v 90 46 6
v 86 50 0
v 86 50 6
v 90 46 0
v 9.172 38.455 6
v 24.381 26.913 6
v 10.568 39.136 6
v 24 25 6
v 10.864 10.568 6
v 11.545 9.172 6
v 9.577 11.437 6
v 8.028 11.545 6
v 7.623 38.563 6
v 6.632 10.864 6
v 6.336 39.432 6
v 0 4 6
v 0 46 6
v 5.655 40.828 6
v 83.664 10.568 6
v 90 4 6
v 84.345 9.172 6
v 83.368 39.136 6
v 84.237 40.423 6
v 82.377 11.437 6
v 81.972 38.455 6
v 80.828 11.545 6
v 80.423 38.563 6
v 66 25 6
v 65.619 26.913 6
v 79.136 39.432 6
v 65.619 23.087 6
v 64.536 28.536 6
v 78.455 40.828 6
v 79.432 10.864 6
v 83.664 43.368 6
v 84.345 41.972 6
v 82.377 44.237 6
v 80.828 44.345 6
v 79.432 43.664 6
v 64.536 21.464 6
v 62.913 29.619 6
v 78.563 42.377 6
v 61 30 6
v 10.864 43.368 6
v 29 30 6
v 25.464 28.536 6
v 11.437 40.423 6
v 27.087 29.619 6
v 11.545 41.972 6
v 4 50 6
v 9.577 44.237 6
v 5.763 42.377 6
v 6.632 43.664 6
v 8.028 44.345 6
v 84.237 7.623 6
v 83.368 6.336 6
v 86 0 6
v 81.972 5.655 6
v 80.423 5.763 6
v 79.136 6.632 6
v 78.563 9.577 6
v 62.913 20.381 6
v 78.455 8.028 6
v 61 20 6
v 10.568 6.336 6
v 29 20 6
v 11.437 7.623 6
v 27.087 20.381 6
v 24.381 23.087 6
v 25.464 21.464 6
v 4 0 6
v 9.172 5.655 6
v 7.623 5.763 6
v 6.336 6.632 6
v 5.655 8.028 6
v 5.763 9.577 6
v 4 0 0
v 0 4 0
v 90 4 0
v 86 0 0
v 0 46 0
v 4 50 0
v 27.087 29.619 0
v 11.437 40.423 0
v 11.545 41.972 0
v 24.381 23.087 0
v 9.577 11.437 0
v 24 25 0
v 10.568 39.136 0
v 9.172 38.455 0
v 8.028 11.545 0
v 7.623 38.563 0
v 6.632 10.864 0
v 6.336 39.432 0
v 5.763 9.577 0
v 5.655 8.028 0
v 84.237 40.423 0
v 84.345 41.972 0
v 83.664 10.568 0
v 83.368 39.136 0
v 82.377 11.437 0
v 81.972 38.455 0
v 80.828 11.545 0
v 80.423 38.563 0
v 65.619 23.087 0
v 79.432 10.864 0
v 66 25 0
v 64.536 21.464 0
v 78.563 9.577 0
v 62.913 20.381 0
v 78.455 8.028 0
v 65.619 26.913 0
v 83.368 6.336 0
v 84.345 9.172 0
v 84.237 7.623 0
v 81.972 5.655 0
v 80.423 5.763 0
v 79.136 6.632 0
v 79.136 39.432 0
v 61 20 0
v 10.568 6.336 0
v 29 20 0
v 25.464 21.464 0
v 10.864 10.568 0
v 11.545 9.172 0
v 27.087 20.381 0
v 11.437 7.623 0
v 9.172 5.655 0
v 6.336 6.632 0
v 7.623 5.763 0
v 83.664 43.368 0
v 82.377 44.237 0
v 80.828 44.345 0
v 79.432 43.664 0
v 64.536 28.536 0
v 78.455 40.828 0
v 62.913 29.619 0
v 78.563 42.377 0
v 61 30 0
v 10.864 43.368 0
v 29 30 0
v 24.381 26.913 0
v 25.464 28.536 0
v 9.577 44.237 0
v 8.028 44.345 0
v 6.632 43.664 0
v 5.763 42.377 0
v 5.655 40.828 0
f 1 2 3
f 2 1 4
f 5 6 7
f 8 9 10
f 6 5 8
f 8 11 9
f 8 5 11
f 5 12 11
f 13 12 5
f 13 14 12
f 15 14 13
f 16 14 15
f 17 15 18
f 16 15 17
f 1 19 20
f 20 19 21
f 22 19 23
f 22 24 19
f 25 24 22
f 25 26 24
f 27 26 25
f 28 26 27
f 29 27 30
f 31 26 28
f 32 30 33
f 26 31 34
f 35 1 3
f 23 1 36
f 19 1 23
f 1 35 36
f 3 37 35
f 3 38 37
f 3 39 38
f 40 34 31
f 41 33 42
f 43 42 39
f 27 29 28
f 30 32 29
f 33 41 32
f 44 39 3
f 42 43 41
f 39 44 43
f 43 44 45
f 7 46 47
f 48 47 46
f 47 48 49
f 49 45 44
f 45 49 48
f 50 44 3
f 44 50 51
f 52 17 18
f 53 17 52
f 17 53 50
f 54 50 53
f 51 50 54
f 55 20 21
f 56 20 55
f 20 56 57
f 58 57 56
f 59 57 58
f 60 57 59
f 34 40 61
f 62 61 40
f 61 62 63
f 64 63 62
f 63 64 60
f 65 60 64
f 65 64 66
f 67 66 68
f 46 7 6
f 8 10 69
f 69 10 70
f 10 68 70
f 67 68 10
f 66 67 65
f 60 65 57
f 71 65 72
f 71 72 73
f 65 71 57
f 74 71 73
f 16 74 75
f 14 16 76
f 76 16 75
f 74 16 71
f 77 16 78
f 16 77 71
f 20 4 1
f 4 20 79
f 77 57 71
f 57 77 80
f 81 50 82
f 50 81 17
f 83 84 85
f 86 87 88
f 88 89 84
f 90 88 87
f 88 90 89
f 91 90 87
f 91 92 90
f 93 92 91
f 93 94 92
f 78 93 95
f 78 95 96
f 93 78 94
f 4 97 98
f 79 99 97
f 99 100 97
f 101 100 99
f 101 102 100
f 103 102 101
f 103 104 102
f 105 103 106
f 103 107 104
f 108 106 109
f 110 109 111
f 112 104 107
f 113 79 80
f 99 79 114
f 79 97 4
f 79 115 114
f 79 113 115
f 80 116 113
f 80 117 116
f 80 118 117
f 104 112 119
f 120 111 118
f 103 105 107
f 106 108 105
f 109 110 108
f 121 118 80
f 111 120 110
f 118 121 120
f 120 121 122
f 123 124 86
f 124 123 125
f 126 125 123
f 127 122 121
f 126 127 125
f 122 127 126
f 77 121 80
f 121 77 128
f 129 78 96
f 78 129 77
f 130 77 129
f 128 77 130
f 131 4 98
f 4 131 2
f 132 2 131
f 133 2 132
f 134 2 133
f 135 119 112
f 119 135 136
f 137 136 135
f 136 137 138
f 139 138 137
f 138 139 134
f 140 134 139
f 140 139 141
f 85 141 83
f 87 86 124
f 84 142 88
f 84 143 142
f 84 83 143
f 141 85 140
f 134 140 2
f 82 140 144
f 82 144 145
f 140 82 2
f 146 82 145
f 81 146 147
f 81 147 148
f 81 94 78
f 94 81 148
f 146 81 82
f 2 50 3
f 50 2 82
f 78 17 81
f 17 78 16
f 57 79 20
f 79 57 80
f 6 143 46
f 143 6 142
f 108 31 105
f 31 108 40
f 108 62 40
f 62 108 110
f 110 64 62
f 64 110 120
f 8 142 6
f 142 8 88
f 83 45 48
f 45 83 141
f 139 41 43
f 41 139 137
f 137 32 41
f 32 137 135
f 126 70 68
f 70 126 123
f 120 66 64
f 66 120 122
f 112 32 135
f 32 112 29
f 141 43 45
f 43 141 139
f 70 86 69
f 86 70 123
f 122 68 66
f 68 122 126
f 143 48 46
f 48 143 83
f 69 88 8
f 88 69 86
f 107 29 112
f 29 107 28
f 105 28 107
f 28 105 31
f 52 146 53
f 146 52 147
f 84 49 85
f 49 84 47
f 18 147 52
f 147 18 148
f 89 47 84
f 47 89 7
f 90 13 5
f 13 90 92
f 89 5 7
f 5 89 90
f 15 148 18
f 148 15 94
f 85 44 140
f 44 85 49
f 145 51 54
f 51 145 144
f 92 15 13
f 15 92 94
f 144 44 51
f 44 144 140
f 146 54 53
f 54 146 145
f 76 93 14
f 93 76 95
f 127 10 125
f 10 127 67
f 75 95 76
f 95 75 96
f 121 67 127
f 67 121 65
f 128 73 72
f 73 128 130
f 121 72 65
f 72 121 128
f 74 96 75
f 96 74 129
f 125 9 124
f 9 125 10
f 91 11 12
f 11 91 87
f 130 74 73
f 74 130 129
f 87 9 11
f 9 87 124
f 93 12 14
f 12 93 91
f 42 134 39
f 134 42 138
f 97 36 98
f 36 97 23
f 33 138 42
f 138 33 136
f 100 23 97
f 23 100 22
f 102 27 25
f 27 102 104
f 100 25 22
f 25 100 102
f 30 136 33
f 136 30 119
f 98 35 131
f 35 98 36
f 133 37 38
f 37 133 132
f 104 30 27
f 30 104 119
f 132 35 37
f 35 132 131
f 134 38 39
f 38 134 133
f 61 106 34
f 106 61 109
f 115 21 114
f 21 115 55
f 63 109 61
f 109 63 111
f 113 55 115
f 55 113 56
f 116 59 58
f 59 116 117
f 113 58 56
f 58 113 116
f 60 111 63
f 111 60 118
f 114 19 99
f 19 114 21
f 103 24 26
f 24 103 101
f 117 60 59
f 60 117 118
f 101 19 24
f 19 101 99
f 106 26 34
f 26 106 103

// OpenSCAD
$fn = 32;

// ----------------------------------------------------------------------
// Bracket plate: slot plate 90 x 50
// ----------------------------------------------------------------------

// --- parameters (mm) ---
hole_r = 3;               // bolt hole radius
plate_t = 6;              // plate thickness, Z (extrusion height)
plate_l = 90;             // plate length
plate_w = 50;             // plate width
slot_l = 32;              // slot straight length
slot_r = 5;               // slot end radius

slot_len = slot_l + 2 * slot_r;
slot_w = 2 * slot_r;
hole_d2 = 2 * hole_r;

profile = [[4, 0], [86, 0], [90, 4], [90, 46], [86, 50], [4, 50], [0, 46], [0, 4]];  // primary outline, 8 points, counter clockwise
void_1 = [[61, 20], [62.913, 20.381], [64.536, 21.464], [65.619, 23.087], [66, 25], [65.619, 26.913], [64.536, 28.536], [62.913, 29.619], [61, 30], [29, 30], [27.087, 29.619], [25.464, 28.536], [24.381, 26.913], [24, 25], [24.381, 23.087], [25.464, 21.464], [27.087, 20.381], [29, 20]];  // grip slot, 18 points
void_2 = [[11.545, 41.972], [10.864, 43.368], [9.577, 44.237], [8.028, 44.345], [6.632, 43.664], [5.763, 42.377], [5.655, 40.828], [6.336, 39.432], [7.623, 38.563], [9.172, 38.455], [10.568, 39.136], [11.437, 40.423]];  // corner hole, 12 points
void_3 = [[11.545, 9.172], [10.864, 10.568], [9.577, 11.437], [8.028, 11.545], [6.632, 10.864], [5.763, 9.577], [5.655, 8.028], [6.336, 6.632], [7.623, 5.763], [9.172, 5.655], [10.568, 6.336], [11.437, 7.623]];  // corner hole, 12 points
void_4 = [[84.345, 41.972], [83.664, 43.368], [82.377, 44.237], [80.828, 44.345], [79.432, 43.664], [78.563, 42.377], [78.455, 40.828], [79.136, 39.432], [80.423, 38.563], [81.972, 38.455], [83.368, 39.136], [84.237, 40.423]];  // corner hole, 12 points
void_5 = [[84.345, 9.172], [83.664, 10.568], [82.377, 11.437], [80.828, 11.545], [79.432, 10.864], [78.563, 9.577], [78.455, 8.028], [79.136, 6.632], [80.423, 5.763], [81.972, 5.655], [83.368, 6.336], [84.237, 7.623]];  // corner hole, 12 points

// --- the one profile operation ---
difference() {
  linear_extrude(height = plate_t) polygon(points = profile);
  translate([0, 0, -1])
    linear_extrude(height = plate_t + 2) polygon(points = void_1);
  translate([0, 0, -1])
    linear_extrude(height = plate_t + 2) polygon(points = void_2);
  translate([0, 0, -1])
    linear_extrude(height = plate_t + 2) polygon(points = void_3);
  translate([0, 0, -1])
    linear_extrude(height = plate_t + 2) polygon(points = void_4);
  translate([0, 0, -1])
    linear_extrude(height = plate_t + 2) polygon(points = void_5);
}
